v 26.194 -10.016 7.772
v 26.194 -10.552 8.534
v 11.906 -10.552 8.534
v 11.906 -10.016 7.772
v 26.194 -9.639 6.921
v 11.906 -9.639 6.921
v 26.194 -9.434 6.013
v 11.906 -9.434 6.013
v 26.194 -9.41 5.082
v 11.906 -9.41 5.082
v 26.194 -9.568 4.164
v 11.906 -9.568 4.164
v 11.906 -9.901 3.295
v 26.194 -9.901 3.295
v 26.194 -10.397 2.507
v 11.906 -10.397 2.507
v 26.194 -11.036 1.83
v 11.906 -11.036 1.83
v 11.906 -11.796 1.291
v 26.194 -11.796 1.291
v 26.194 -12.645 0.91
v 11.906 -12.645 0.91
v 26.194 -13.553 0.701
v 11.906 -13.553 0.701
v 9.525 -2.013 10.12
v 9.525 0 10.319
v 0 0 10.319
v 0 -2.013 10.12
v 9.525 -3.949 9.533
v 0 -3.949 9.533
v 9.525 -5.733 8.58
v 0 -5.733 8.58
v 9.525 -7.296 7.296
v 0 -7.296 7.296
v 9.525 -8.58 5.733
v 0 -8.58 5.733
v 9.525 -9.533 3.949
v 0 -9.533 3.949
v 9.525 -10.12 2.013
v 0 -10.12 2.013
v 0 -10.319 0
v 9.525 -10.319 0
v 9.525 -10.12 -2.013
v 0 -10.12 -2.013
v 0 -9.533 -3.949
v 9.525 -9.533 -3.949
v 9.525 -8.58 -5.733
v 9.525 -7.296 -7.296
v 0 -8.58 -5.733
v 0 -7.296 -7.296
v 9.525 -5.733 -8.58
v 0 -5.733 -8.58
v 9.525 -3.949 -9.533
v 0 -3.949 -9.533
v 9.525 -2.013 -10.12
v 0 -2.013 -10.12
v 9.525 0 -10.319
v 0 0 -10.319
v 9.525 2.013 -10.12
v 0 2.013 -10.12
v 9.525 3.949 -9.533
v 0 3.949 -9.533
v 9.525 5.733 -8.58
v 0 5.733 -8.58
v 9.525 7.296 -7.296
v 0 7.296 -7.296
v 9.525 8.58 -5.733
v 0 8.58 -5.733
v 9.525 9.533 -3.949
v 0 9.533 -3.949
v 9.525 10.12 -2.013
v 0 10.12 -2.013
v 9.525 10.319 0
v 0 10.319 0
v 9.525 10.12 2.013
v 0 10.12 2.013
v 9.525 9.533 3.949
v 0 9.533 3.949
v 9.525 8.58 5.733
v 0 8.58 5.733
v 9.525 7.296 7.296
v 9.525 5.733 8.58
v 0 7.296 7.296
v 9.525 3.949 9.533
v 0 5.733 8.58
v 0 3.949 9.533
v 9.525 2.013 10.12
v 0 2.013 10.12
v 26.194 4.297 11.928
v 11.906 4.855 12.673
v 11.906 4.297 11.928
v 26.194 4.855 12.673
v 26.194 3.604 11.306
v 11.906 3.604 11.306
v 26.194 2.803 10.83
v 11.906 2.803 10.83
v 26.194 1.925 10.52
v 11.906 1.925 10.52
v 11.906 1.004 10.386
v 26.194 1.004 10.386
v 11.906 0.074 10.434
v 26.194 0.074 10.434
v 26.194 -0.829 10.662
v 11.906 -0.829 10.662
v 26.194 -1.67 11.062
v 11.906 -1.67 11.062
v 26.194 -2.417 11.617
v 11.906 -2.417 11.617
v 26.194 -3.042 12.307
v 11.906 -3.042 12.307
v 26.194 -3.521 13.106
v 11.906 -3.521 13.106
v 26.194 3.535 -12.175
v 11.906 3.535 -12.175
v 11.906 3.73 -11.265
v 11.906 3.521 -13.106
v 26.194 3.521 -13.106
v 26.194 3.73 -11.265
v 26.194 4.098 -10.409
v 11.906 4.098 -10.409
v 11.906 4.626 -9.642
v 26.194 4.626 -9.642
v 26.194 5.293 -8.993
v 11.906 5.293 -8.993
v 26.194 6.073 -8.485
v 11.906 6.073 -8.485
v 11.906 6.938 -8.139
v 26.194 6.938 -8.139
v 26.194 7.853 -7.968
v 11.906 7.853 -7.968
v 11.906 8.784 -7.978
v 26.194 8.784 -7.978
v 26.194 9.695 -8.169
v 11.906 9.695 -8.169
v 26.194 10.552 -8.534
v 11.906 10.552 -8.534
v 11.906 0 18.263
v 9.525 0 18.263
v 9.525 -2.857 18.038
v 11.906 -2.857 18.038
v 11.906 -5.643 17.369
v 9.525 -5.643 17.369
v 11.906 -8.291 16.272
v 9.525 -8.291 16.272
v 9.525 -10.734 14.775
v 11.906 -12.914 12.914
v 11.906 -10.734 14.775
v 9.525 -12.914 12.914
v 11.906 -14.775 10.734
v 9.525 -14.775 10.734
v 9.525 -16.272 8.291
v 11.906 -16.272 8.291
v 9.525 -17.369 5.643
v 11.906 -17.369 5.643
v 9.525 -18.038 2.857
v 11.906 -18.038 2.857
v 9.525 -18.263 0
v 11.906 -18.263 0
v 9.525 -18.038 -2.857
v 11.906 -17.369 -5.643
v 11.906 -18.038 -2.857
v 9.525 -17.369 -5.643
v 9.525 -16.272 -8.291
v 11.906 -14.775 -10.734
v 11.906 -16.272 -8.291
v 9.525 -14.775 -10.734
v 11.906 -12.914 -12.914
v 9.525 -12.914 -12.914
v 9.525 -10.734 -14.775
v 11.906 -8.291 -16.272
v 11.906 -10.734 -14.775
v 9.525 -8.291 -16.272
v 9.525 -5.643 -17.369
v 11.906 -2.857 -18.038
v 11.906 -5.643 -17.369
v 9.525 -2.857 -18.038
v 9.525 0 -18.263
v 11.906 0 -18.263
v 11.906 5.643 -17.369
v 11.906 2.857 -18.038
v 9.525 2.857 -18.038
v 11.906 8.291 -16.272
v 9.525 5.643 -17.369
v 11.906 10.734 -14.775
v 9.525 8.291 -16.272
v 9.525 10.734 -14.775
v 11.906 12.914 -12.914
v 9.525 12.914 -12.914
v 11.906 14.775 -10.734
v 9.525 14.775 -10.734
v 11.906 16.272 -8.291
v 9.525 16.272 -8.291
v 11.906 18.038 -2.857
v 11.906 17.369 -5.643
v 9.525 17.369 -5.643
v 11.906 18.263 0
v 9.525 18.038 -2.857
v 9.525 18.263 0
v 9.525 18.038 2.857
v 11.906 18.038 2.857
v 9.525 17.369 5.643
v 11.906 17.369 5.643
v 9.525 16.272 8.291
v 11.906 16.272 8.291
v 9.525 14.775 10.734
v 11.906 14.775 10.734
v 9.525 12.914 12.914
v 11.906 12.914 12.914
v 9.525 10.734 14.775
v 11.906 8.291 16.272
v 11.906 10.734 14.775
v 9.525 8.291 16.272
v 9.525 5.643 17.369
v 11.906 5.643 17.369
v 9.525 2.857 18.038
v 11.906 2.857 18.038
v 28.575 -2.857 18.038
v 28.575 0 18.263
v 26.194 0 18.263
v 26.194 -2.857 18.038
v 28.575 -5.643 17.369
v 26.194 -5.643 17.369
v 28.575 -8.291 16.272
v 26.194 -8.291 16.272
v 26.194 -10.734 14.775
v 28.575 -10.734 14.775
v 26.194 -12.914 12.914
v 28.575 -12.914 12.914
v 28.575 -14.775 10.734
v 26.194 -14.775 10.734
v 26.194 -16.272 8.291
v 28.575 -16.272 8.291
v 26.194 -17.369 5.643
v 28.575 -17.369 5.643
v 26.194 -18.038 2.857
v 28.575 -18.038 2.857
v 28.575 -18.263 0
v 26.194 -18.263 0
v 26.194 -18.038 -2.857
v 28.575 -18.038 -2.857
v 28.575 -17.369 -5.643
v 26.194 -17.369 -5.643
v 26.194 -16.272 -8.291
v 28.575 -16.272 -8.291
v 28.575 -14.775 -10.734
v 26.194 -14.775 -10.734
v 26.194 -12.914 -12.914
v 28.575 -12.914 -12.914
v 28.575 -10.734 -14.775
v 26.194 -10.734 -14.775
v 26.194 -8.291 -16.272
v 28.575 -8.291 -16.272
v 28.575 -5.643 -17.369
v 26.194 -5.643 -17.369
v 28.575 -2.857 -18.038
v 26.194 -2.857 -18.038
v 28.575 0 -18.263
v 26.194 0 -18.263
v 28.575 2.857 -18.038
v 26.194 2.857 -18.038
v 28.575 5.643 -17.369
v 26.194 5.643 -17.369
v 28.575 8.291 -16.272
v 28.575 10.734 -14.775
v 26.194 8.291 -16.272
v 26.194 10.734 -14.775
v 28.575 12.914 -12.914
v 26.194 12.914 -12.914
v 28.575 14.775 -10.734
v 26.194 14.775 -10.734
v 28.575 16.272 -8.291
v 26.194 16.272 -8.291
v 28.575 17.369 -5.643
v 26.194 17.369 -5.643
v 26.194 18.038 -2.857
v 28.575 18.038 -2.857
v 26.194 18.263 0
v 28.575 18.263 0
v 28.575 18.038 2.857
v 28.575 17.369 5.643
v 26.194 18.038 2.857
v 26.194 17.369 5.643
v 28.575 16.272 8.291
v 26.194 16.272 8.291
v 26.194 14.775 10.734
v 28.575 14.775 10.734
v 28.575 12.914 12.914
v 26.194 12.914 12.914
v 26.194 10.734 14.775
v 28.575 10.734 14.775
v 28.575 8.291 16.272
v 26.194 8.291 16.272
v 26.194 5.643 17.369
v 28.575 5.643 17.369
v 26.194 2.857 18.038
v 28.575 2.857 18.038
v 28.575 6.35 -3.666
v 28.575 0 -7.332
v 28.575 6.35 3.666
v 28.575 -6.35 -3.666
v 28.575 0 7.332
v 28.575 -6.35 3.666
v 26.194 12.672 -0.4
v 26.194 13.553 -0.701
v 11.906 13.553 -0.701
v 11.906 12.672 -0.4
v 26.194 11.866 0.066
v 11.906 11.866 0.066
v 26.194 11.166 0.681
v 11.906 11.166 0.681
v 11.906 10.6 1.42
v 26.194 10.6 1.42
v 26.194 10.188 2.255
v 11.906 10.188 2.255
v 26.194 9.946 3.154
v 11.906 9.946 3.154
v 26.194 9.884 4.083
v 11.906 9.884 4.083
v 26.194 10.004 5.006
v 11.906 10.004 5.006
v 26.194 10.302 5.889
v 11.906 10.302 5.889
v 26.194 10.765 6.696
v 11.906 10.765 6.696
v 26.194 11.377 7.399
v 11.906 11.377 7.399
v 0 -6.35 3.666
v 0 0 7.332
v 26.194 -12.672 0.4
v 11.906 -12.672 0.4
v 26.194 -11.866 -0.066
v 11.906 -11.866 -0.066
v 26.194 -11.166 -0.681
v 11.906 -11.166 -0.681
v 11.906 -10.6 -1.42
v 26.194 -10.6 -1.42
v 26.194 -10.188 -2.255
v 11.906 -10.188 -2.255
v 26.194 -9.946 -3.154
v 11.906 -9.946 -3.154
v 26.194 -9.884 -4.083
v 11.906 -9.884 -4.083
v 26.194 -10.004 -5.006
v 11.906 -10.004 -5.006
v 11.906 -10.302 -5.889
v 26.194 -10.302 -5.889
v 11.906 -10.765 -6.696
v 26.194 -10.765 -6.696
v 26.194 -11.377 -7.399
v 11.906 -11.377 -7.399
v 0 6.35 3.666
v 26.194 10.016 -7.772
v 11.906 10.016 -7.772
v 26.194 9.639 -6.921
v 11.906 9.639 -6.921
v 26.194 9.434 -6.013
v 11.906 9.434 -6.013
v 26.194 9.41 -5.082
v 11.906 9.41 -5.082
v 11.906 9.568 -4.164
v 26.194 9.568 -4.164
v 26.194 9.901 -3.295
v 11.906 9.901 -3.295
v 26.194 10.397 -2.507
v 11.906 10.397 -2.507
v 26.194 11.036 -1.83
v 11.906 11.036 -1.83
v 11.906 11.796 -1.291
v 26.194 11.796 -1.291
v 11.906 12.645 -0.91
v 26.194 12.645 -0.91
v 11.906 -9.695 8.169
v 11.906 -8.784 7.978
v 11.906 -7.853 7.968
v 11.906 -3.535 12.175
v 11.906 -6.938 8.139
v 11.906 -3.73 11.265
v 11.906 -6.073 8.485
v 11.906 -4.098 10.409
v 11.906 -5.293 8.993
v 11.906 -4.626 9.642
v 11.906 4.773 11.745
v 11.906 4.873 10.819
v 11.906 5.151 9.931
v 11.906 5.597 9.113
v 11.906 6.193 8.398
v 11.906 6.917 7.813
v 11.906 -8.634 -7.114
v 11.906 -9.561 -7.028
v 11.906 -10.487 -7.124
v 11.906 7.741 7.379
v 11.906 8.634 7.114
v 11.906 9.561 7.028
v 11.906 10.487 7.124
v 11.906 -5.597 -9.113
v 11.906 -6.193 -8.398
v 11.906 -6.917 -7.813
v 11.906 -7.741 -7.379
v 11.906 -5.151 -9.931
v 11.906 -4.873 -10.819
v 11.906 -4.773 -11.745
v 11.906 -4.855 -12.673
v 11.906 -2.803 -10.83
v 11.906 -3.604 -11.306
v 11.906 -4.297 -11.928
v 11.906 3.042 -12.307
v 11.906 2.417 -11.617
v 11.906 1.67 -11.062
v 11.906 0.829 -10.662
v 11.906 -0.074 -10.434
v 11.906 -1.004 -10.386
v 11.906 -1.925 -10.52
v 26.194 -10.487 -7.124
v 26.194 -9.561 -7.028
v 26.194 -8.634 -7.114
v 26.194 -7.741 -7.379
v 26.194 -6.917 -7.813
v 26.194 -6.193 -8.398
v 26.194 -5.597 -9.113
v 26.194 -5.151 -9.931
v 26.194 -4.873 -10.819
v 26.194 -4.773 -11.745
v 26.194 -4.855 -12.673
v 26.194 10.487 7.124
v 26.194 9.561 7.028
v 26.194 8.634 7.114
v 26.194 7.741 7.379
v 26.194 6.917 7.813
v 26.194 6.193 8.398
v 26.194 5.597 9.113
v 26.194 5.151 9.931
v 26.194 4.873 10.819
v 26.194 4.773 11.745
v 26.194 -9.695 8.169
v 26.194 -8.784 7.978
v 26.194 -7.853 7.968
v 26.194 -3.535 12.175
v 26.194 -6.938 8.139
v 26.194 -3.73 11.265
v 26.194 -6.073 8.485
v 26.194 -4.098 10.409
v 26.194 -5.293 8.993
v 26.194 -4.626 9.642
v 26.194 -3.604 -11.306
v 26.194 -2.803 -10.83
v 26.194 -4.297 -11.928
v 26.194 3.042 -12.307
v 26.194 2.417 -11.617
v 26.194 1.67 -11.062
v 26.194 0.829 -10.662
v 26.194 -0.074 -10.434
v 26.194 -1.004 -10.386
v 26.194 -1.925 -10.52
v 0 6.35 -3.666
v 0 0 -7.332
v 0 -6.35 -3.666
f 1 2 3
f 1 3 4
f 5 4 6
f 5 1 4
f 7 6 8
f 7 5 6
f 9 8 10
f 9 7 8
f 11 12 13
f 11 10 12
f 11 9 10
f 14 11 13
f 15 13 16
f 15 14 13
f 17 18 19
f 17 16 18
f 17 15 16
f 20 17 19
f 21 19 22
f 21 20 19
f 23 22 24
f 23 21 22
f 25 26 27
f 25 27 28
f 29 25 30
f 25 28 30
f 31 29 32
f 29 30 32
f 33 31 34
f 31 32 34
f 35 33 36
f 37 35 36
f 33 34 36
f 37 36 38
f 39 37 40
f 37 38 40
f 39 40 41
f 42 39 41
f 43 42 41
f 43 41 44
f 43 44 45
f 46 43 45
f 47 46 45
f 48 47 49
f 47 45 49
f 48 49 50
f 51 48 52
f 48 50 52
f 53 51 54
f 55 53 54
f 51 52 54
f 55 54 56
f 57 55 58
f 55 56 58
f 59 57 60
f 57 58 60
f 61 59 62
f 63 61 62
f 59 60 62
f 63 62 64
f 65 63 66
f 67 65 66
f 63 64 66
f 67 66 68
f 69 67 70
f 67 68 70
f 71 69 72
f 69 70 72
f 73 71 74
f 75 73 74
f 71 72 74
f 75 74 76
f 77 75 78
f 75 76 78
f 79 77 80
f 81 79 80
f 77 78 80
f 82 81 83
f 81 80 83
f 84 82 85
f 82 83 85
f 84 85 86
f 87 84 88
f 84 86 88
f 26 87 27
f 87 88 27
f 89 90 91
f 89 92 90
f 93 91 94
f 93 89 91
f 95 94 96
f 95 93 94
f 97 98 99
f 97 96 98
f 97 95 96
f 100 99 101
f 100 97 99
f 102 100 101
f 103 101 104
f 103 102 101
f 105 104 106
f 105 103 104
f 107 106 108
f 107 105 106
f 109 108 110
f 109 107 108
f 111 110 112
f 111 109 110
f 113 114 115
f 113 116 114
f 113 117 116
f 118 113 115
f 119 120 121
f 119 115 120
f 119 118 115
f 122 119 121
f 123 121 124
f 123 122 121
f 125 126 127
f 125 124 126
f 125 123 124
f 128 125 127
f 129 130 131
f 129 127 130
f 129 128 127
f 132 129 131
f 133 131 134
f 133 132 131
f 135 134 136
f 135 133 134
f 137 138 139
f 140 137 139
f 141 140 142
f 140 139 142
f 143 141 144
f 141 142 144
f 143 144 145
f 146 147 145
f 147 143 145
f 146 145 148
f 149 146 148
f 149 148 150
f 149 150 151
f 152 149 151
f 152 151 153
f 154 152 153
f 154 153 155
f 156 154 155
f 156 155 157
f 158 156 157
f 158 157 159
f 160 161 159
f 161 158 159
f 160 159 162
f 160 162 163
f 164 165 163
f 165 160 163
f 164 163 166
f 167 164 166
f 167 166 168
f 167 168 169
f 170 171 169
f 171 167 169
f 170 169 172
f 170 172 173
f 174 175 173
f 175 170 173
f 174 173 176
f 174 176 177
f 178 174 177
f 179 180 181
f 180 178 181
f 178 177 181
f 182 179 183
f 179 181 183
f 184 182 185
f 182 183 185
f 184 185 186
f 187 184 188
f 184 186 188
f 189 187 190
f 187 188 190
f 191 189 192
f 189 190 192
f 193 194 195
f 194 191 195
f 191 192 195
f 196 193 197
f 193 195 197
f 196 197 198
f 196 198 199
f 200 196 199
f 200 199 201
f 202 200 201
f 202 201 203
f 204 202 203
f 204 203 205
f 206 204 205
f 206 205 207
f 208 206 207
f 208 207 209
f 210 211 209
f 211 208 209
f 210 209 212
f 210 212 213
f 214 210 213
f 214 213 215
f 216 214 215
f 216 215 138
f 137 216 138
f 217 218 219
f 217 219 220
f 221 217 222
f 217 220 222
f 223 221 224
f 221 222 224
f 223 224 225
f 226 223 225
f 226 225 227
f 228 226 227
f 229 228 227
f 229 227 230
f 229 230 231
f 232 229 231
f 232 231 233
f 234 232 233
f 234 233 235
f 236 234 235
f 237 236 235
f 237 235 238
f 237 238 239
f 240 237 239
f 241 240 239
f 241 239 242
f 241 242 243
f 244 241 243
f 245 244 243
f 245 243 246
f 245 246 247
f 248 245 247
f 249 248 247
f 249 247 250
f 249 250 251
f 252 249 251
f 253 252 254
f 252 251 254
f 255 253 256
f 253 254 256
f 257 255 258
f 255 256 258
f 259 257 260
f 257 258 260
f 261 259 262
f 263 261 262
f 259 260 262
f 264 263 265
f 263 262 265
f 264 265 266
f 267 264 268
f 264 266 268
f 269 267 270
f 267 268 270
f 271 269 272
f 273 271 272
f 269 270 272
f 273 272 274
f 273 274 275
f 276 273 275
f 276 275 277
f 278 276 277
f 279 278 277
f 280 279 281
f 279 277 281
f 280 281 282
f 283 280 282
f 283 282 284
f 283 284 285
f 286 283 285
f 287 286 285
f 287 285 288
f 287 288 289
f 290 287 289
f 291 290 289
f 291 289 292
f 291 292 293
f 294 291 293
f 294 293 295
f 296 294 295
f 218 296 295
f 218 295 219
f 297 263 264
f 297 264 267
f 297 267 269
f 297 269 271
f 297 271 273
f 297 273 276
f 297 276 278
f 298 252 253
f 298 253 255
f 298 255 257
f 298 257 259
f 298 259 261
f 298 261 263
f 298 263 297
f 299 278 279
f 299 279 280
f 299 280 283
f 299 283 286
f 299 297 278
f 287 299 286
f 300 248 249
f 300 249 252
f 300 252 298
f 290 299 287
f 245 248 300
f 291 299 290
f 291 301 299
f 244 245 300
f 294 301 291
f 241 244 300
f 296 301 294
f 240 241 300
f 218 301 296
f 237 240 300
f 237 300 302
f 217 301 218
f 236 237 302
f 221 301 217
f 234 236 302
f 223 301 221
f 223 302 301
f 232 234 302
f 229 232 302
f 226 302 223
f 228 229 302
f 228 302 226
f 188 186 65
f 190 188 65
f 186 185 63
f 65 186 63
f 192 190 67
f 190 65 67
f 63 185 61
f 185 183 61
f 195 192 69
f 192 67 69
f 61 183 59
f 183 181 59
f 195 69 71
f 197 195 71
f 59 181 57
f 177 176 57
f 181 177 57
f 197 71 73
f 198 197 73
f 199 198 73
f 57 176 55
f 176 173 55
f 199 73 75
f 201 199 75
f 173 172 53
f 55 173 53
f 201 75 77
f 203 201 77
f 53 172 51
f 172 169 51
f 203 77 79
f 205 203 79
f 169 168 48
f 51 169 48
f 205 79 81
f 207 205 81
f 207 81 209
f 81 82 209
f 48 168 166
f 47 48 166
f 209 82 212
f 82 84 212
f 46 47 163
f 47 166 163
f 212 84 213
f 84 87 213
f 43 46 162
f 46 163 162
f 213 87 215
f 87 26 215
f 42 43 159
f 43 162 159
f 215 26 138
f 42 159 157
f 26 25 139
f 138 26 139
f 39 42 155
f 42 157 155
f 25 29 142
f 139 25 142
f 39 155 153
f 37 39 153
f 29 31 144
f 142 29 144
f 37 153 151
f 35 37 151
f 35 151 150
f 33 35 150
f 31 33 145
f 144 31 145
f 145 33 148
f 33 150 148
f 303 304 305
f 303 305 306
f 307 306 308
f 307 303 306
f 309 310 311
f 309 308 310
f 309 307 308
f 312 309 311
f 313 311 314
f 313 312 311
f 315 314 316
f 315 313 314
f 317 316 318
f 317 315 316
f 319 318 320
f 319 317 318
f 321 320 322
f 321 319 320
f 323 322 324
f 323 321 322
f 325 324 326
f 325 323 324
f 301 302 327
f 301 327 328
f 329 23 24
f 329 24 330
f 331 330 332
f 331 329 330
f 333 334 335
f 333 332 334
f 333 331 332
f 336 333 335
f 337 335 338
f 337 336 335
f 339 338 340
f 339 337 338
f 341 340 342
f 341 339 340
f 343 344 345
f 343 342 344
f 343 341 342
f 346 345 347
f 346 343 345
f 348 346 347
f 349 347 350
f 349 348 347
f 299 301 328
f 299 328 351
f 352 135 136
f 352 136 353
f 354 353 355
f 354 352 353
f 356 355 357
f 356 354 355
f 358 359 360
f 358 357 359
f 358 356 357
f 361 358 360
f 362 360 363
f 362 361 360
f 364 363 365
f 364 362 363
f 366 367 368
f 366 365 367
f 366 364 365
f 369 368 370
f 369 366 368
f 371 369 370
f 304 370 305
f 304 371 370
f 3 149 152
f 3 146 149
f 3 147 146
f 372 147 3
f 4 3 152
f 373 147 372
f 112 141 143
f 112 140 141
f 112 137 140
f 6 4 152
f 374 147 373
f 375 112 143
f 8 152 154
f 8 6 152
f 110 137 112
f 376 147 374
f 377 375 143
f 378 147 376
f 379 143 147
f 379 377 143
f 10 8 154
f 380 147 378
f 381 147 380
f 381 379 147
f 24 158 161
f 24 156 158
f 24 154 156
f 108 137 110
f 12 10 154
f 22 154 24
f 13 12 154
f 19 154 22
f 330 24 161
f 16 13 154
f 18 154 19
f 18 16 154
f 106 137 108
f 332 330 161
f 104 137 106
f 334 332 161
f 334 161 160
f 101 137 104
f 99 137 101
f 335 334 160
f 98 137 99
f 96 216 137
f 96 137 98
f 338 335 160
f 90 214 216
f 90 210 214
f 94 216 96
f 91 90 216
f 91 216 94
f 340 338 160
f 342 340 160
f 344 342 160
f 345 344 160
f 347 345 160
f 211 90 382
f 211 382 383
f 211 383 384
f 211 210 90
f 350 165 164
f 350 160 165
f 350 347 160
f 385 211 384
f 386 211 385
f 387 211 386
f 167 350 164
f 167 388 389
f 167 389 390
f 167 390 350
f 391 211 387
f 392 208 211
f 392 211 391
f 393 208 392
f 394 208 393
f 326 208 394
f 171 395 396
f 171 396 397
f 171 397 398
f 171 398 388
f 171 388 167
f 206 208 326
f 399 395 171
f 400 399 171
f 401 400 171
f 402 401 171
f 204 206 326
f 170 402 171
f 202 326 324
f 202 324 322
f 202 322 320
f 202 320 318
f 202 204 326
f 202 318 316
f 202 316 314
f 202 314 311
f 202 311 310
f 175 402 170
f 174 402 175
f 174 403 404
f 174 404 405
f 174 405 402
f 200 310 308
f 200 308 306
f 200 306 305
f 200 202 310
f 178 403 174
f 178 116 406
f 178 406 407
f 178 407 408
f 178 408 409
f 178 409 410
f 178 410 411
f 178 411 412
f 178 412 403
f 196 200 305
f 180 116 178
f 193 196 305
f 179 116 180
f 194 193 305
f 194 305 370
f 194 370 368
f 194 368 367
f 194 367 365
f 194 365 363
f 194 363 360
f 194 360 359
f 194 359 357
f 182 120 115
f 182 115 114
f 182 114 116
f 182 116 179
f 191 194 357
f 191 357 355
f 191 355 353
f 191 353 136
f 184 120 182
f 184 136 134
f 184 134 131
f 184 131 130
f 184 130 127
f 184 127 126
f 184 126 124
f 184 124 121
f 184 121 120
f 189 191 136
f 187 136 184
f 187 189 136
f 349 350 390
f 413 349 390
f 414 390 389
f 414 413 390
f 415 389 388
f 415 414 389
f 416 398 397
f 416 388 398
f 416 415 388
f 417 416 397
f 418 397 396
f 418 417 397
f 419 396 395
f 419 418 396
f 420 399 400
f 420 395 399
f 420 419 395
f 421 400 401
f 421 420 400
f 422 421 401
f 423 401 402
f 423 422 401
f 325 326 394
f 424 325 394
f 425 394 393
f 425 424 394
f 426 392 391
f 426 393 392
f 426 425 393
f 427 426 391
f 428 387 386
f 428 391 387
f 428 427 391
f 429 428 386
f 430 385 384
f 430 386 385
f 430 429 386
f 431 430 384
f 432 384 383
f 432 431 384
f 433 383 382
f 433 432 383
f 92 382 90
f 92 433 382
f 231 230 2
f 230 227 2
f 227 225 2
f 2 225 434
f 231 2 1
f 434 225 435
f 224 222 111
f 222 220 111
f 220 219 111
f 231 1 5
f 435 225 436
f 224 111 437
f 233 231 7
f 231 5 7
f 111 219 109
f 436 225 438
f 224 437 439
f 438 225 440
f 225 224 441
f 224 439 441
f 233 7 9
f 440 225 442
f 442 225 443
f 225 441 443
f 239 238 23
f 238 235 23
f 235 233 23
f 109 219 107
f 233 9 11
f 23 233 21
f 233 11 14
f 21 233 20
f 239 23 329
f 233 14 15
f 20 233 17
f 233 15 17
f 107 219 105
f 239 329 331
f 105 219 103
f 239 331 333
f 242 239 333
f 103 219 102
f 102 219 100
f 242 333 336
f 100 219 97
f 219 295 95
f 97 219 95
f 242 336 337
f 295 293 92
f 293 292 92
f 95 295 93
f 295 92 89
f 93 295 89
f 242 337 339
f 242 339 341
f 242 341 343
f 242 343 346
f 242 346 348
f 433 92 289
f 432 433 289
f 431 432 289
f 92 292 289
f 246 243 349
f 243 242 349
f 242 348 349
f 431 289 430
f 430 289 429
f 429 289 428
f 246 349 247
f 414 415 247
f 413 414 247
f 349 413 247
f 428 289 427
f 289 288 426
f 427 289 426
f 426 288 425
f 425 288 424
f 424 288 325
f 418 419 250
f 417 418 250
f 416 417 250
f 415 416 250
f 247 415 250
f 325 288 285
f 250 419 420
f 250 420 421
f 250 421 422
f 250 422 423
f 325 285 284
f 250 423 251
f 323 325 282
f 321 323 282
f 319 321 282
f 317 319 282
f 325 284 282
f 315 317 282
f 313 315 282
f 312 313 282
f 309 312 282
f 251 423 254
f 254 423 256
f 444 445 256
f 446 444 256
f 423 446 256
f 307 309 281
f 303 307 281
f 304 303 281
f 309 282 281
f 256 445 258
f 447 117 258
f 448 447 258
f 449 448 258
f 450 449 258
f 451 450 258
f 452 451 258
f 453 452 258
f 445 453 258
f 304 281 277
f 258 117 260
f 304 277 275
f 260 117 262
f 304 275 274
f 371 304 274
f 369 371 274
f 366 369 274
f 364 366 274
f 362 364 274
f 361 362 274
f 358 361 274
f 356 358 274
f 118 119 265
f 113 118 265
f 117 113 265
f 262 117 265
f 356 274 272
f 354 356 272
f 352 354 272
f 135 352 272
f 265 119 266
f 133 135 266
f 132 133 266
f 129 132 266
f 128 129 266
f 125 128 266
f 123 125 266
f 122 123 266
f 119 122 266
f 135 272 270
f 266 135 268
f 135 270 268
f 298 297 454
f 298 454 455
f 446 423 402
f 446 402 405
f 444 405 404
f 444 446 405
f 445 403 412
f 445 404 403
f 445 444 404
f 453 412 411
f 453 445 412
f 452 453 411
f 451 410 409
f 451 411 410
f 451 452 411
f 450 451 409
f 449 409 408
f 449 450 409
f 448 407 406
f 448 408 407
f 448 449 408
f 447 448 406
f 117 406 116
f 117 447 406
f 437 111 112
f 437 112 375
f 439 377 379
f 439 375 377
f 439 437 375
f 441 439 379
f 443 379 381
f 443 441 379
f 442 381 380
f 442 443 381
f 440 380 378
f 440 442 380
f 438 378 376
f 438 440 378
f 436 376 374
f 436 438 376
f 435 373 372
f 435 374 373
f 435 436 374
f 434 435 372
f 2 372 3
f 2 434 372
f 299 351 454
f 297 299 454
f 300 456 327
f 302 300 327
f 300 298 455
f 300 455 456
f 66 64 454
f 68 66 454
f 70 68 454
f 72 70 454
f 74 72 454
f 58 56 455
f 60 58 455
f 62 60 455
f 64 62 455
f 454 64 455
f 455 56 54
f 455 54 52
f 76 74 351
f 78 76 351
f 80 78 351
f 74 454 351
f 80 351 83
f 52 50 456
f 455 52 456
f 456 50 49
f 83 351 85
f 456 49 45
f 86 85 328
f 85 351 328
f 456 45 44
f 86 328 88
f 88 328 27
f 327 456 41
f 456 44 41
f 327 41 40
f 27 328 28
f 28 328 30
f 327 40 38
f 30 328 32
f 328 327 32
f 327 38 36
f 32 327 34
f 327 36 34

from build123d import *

# Parameters (mm, degrees)
SKETCH1_R           = 10.31875
BOSS_EXTRUDE1_DEPTH = 9.525
SKETCH2_R           = 18.2626
BOSS_EXTRUDE2_DEPTH = 19.05
CUT_EXTRUDE1_START  = -2.38125
SKETCH3_OUTSIDE_W   = 50.332
SKETCH3_OUTSIDE_H   = 50.332
SKETCH3_OUTSIDE_R   = 15.1638
CUT_EXTRUDE1_DEPTH  = 14.2875
CUT_EXTRUDE2_DEPTH  = 14.2875
CIRPATTERN1_COUNT   = 10
CUT_EXTRUDE3_DEPTH  = 39.517213587


with BuildPart() as part:
    # Sketch1 → Boss-Extrude1 (new body)
    with BuildSketch(Plane(origin=(0, 0, 0), x_dir=(0, 0, -1), z_dir=(1, 0, 0))):
        Circle(SKETCH1_R)
    extrude(amount=BOSS_EXTRUDE1_DEPTH)

    # Sketch2 → Boss-Extrude2 (add)
    with BuildSketch(Plane(origin=(9.525, 0, 0), x_dir=(0, 0, -1), z_dir=(1, 0, 0))):
        Circle(SKETCH2_R)
    extrude(amount=BOSS_EXTRUDE2_DEPTH)

    # Sketch3 outside → Cut-Extrude1 (cut)
    with BuildSketch(Plane(origin=(28.575, 0, 0), x_dir=(0, 0, -1), z_dir=(1, 0, 0)).offset(CUT_EXTRUDE1_START)):
        Rectangle(SKETCH3_OUTSIDE_W, SKETCH3_OUTSIDE_H)
        Circle(SKETCH3_OUTSIDE_R, mode=Mode.SUBTRACT)
    extrude(amount=-CUT_EXTRUDE1_DEPTH, mode=Mode.SUBTRACT)

    # Sketch4 → Cut-Extrude2 (cut)
    with BuildSketch(Plane.ZY.offset(-26.19375)):
        with BuildLine():
            ThreePointArc((-7.949596792, 8.267008262), (-8.360122852, 10.201363213), (-9.520926588, 11.80223654))
            ThreePointArc((-9.520926588, 11.80223654), (-12.712096792, 8.267008262), (-14.649343405, 3.916320752))
            ThreePointArc((-14.649343405, 3.916320752), (-10.11832837, 4.272790989), (-7.949596792, 8.267008262))
        make_face()
    cut_extrude2 = extrude(amount=CUT_EXTRUDE2_DEPTH, mode=Mode.SUBTRACT)

    # CirPattern1: Cut-Extrude2 ×10 about axis
    cirpattern1_axis = Axis((9.525, 0, 0), (-1, 0, 0))
    for i in range(1, CIRPATTERN1_COUNT):
        add(cut_extrude2.rotate(cirpattern1_axis, i * 360 / CIRPATTERN1_COUNT), mode=Mode.SUBTRACT)

    # Sketch5 → Cut-Extrude3 (cut, through all)
    with BuildSketch(Plane.ZY):
        Polygon((-7.332348419, 0), (-3.666174209, -6.35), (3.666174209, -6.35), (7.332348419, 0), (3.666174209, 6.35), (-3.666174209, 6.35), align=None)
    extrude(amount=-CUT_EXTRUDE3_DEPTH, mode=Mode.SUBTRACT)


solid = part.part
